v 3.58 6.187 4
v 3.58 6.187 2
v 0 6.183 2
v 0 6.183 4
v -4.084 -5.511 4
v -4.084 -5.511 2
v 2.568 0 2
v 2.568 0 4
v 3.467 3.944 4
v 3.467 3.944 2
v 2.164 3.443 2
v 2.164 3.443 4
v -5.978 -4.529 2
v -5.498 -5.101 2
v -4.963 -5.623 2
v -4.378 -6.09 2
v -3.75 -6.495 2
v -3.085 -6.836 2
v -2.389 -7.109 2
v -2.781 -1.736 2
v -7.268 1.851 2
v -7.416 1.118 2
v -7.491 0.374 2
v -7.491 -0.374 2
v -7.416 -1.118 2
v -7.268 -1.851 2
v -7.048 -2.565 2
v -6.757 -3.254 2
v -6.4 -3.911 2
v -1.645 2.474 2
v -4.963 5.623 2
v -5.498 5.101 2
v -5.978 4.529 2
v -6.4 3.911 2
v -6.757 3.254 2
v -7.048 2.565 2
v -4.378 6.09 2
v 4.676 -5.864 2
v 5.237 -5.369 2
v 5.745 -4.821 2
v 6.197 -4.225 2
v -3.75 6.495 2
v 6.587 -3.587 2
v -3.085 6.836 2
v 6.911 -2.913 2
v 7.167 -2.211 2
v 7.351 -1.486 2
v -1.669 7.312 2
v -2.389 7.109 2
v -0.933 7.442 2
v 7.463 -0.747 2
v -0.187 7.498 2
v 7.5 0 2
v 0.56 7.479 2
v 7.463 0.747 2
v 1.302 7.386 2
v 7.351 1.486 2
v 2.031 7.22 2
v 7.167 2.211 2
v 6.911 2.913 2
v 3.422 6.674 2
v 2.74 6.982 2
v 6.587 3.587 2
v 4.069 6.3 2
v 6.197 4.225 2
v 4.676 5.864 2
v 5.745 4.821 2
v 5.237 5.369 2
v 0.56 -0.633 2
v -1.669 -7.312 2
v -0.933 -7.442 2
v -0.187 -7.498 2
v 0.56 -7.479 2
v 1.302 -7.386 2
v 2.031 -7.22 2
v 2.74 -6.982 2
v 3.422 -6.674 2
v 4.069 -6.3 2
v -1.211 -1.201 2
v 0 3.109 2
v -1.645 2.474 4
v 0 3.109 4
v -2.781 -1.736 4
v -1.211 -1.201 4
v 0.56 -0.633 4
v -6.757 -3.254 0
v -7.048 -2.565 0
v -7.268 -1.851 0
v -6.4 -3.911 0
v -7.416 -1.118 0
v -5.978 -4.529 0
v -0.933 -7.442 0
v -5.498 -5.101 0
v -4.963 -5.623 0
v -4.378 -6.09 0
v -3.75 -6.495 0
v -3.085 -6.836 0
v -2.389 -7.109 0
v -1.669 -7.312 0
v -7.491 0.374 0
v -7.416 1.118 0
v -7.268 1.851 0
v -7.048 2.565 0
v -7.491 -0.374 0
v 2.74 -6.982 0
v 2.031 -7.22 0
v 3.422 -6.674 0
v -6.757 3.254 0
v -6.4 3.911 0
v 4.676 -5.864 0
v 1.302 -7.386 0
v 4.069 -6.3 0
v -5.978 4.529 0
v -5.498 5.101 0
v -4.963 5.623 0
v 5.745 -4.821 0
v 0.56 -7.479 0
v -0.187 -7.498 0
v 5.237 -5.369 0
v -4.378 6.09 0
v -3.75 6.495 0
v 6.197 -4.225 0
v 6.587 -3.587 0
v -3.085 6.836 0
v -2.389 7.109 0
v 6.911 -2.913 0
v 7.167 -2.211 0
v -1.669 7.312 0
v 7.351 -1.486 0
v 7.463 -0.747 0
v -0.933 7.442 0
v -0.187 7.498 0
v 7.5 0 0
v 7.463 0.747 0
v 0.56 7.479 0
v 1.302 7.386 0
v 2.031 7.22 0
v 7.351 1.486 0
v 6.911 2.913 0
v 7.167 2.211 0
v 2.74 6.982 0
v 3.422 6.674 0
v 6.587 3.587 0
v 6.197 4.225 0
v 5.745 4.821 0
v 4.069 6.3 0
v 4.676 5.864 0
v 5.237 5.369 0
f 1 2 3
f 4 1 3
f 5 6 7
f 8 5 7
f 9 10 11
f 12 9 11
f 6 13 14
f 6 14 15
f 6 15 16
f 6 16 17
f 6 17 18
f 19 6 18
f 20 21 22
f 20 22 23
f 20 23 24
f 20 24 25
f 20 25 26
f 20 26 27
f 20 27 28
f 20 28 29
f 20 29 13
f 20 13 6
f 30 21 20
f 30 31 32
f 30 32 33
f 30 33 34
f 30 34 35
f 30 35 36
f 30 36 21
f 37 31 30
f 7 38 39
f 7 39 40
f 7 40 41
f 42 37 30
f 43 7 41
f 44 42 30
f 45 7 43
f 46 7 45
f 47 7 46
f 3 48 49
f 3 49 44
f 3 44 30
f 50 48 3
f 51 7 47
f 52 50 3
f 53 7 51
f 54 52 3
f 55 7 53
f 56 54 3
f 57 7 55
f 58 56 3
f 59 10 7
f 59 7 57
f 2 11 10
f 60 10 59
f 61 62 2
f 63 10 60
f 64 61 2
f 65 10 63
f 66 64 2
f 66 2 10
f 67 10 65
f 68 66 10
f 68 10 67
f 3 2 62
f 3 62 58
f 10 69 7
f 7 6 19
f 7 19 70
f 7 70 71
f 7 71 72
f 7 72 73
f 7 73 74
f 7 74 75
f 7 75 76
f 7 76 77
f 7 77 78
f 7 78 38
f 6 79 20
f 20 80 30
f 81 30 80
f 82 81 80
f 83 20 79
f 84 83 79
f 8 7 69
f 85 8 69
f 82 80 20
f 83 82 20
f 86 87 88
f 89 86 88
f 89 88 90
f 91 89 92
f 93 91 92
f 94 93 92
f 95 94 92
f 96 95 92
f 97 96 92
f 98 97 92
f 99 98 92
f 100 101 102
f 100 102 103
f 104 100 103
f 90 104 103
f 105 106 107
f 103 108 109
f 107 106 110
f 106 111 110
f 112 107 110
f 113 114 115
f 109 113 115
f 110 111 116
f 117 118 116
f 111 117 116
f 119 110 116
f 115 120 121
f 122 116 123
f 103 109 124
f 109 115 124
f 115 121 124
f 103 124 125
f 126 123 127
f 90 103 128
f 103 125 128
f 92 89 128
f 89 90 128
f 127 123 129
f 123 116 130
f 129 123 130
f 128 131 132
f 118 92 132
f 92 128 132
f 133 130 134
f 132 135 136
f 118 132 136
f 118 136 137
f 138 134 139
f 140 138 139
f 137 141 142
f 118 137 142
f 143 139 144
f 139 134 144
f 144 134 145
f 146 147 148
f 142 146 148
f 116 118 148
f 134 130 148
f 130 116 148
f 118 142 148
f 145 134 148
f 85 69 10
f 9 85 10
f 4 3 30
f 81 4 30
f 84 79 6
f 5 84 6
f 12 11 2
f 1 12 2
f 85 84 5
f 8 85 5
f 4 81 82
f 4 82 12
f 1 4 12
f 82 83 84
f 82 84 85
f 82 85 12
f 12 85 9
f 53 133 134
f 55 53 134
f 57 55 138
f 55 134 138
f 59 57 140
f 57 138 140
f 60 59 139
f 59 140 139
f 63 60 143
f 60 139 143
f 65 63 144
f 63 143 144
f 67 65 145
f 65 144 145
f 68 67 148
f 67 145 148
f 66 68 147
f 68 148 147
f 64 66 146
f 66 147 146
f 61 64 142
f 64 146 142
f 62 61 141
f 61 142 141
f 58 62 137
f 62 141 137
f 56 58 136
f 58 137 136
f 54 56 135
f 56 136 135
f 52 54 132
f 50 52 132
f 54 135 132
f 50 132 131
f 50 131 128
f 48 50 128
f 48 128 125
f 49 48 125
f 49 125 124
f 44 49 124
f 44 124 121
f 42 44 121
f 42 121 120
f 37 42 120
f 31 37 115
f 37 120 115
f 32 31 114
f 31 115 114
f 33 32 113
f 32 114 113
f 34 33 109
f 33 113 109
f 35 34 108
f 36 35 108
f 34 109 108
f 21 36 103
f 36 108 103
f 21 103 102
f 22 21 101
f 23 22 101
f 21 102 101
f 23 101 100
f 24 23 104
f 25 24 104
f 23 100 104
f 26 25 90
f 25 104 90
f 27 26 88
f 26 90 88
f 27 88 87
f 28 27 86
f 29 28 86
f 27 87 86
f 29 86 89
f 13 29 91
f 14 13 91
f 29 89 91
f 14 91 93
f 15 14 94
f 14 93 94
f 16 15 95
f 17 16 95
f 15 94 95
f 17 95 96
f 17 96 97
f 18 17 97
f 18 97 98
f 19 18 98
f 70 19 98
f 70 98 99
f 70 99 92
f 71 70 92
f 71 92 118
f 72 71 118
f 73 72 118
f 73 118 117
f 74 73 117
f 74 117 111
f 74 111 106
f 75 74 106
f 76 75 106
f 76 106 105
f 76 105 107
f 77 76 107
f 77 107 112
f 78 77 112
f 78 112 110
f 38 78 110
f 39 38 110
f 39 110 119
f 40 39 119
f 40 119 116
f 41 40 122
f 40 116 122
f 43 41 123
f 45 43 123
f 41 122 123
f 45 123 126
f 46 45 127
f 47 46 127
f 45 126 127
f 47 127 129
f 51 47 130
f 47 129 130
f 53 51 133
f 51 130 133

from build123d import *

# Parameters (mm, degrees)
F0_R     = 7.5
F1_DEPTH = 2
F3_DEPTH = 2


with BuildPart() as f1:
    # F0 (on Top) → F1 (new body)
    with BuildSketch(Plane.XY):
        Circle(F0_R)
    extrude(amount=F1_DEPTH)

    # F2 (on face) → F3 (join)
    with BuildSketch(Plane.XY.offset(2)):
        Polygon((3.580205, 6.186631), (0, 6.182709), (-1.645398, 2.474013), (0, 3.108835), (-2.781395, -1.735857), (-1.211046, -1.20127), (-4.08445, -5.511376), (2.567615, 0), (0.559772, -0.633272), (3.466587, 3.944127), (2.163532, 3.442952), align=None)
    extrude(amount=F3_DEPTH)


solid = f1.part
